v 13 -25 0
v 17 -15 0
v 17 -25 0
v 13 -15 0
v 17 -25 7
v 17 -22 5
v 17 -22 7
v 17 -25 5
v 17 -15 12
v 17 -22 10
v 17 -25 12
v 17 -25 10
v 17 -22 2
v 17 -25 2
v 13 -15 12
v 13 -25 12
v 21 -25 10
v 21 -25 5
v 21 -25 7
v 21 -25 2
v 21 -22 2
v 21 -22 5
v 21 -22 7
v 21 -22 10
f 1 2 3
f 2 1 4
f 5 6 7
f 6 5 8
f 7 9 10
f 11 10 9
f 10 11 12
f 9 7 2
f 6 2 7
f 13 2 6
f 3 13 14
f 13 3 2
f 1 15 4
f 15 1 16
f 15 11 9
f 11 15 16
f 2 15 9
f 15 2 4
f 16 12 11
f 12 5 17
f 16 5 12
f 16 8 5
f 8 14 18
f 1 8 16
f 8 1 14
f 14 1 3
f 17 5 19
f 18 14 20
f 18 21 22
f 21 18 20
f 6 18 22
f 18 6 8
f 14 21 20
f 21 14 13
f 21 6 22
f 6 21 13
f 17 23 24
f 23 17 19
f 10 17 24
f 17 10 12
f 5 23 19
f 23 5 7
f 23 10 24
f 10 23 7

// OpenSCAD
module pumpgrip() {
    difference(){
        union(){
            //translate([0,0,0]) cube([20,30,2.5]);
            //translate([0,0,9.5]) cube([20,35,2.5]);
            //translate([0,-5,0]) cube([20,10,12]); 
            
            //translate([0,-15,0]) cube([20,10,12]);
            rotate([0,90,0]) translate([-12,-25,13]) cube([12,10,4]);
            translate([17,-25,2]) cube([4,3,3]);
            translate([17,-25,7]) cube([4,3,3]);
        }
        
        union(){
            translate([10,25,0]) cylinder(d=16, h=5);
            //rotate([90,0,0]) translate([10,6,-10]) cylinder(d=5, h=30);
        }
    }
}




pumpgrip($fn=100);
